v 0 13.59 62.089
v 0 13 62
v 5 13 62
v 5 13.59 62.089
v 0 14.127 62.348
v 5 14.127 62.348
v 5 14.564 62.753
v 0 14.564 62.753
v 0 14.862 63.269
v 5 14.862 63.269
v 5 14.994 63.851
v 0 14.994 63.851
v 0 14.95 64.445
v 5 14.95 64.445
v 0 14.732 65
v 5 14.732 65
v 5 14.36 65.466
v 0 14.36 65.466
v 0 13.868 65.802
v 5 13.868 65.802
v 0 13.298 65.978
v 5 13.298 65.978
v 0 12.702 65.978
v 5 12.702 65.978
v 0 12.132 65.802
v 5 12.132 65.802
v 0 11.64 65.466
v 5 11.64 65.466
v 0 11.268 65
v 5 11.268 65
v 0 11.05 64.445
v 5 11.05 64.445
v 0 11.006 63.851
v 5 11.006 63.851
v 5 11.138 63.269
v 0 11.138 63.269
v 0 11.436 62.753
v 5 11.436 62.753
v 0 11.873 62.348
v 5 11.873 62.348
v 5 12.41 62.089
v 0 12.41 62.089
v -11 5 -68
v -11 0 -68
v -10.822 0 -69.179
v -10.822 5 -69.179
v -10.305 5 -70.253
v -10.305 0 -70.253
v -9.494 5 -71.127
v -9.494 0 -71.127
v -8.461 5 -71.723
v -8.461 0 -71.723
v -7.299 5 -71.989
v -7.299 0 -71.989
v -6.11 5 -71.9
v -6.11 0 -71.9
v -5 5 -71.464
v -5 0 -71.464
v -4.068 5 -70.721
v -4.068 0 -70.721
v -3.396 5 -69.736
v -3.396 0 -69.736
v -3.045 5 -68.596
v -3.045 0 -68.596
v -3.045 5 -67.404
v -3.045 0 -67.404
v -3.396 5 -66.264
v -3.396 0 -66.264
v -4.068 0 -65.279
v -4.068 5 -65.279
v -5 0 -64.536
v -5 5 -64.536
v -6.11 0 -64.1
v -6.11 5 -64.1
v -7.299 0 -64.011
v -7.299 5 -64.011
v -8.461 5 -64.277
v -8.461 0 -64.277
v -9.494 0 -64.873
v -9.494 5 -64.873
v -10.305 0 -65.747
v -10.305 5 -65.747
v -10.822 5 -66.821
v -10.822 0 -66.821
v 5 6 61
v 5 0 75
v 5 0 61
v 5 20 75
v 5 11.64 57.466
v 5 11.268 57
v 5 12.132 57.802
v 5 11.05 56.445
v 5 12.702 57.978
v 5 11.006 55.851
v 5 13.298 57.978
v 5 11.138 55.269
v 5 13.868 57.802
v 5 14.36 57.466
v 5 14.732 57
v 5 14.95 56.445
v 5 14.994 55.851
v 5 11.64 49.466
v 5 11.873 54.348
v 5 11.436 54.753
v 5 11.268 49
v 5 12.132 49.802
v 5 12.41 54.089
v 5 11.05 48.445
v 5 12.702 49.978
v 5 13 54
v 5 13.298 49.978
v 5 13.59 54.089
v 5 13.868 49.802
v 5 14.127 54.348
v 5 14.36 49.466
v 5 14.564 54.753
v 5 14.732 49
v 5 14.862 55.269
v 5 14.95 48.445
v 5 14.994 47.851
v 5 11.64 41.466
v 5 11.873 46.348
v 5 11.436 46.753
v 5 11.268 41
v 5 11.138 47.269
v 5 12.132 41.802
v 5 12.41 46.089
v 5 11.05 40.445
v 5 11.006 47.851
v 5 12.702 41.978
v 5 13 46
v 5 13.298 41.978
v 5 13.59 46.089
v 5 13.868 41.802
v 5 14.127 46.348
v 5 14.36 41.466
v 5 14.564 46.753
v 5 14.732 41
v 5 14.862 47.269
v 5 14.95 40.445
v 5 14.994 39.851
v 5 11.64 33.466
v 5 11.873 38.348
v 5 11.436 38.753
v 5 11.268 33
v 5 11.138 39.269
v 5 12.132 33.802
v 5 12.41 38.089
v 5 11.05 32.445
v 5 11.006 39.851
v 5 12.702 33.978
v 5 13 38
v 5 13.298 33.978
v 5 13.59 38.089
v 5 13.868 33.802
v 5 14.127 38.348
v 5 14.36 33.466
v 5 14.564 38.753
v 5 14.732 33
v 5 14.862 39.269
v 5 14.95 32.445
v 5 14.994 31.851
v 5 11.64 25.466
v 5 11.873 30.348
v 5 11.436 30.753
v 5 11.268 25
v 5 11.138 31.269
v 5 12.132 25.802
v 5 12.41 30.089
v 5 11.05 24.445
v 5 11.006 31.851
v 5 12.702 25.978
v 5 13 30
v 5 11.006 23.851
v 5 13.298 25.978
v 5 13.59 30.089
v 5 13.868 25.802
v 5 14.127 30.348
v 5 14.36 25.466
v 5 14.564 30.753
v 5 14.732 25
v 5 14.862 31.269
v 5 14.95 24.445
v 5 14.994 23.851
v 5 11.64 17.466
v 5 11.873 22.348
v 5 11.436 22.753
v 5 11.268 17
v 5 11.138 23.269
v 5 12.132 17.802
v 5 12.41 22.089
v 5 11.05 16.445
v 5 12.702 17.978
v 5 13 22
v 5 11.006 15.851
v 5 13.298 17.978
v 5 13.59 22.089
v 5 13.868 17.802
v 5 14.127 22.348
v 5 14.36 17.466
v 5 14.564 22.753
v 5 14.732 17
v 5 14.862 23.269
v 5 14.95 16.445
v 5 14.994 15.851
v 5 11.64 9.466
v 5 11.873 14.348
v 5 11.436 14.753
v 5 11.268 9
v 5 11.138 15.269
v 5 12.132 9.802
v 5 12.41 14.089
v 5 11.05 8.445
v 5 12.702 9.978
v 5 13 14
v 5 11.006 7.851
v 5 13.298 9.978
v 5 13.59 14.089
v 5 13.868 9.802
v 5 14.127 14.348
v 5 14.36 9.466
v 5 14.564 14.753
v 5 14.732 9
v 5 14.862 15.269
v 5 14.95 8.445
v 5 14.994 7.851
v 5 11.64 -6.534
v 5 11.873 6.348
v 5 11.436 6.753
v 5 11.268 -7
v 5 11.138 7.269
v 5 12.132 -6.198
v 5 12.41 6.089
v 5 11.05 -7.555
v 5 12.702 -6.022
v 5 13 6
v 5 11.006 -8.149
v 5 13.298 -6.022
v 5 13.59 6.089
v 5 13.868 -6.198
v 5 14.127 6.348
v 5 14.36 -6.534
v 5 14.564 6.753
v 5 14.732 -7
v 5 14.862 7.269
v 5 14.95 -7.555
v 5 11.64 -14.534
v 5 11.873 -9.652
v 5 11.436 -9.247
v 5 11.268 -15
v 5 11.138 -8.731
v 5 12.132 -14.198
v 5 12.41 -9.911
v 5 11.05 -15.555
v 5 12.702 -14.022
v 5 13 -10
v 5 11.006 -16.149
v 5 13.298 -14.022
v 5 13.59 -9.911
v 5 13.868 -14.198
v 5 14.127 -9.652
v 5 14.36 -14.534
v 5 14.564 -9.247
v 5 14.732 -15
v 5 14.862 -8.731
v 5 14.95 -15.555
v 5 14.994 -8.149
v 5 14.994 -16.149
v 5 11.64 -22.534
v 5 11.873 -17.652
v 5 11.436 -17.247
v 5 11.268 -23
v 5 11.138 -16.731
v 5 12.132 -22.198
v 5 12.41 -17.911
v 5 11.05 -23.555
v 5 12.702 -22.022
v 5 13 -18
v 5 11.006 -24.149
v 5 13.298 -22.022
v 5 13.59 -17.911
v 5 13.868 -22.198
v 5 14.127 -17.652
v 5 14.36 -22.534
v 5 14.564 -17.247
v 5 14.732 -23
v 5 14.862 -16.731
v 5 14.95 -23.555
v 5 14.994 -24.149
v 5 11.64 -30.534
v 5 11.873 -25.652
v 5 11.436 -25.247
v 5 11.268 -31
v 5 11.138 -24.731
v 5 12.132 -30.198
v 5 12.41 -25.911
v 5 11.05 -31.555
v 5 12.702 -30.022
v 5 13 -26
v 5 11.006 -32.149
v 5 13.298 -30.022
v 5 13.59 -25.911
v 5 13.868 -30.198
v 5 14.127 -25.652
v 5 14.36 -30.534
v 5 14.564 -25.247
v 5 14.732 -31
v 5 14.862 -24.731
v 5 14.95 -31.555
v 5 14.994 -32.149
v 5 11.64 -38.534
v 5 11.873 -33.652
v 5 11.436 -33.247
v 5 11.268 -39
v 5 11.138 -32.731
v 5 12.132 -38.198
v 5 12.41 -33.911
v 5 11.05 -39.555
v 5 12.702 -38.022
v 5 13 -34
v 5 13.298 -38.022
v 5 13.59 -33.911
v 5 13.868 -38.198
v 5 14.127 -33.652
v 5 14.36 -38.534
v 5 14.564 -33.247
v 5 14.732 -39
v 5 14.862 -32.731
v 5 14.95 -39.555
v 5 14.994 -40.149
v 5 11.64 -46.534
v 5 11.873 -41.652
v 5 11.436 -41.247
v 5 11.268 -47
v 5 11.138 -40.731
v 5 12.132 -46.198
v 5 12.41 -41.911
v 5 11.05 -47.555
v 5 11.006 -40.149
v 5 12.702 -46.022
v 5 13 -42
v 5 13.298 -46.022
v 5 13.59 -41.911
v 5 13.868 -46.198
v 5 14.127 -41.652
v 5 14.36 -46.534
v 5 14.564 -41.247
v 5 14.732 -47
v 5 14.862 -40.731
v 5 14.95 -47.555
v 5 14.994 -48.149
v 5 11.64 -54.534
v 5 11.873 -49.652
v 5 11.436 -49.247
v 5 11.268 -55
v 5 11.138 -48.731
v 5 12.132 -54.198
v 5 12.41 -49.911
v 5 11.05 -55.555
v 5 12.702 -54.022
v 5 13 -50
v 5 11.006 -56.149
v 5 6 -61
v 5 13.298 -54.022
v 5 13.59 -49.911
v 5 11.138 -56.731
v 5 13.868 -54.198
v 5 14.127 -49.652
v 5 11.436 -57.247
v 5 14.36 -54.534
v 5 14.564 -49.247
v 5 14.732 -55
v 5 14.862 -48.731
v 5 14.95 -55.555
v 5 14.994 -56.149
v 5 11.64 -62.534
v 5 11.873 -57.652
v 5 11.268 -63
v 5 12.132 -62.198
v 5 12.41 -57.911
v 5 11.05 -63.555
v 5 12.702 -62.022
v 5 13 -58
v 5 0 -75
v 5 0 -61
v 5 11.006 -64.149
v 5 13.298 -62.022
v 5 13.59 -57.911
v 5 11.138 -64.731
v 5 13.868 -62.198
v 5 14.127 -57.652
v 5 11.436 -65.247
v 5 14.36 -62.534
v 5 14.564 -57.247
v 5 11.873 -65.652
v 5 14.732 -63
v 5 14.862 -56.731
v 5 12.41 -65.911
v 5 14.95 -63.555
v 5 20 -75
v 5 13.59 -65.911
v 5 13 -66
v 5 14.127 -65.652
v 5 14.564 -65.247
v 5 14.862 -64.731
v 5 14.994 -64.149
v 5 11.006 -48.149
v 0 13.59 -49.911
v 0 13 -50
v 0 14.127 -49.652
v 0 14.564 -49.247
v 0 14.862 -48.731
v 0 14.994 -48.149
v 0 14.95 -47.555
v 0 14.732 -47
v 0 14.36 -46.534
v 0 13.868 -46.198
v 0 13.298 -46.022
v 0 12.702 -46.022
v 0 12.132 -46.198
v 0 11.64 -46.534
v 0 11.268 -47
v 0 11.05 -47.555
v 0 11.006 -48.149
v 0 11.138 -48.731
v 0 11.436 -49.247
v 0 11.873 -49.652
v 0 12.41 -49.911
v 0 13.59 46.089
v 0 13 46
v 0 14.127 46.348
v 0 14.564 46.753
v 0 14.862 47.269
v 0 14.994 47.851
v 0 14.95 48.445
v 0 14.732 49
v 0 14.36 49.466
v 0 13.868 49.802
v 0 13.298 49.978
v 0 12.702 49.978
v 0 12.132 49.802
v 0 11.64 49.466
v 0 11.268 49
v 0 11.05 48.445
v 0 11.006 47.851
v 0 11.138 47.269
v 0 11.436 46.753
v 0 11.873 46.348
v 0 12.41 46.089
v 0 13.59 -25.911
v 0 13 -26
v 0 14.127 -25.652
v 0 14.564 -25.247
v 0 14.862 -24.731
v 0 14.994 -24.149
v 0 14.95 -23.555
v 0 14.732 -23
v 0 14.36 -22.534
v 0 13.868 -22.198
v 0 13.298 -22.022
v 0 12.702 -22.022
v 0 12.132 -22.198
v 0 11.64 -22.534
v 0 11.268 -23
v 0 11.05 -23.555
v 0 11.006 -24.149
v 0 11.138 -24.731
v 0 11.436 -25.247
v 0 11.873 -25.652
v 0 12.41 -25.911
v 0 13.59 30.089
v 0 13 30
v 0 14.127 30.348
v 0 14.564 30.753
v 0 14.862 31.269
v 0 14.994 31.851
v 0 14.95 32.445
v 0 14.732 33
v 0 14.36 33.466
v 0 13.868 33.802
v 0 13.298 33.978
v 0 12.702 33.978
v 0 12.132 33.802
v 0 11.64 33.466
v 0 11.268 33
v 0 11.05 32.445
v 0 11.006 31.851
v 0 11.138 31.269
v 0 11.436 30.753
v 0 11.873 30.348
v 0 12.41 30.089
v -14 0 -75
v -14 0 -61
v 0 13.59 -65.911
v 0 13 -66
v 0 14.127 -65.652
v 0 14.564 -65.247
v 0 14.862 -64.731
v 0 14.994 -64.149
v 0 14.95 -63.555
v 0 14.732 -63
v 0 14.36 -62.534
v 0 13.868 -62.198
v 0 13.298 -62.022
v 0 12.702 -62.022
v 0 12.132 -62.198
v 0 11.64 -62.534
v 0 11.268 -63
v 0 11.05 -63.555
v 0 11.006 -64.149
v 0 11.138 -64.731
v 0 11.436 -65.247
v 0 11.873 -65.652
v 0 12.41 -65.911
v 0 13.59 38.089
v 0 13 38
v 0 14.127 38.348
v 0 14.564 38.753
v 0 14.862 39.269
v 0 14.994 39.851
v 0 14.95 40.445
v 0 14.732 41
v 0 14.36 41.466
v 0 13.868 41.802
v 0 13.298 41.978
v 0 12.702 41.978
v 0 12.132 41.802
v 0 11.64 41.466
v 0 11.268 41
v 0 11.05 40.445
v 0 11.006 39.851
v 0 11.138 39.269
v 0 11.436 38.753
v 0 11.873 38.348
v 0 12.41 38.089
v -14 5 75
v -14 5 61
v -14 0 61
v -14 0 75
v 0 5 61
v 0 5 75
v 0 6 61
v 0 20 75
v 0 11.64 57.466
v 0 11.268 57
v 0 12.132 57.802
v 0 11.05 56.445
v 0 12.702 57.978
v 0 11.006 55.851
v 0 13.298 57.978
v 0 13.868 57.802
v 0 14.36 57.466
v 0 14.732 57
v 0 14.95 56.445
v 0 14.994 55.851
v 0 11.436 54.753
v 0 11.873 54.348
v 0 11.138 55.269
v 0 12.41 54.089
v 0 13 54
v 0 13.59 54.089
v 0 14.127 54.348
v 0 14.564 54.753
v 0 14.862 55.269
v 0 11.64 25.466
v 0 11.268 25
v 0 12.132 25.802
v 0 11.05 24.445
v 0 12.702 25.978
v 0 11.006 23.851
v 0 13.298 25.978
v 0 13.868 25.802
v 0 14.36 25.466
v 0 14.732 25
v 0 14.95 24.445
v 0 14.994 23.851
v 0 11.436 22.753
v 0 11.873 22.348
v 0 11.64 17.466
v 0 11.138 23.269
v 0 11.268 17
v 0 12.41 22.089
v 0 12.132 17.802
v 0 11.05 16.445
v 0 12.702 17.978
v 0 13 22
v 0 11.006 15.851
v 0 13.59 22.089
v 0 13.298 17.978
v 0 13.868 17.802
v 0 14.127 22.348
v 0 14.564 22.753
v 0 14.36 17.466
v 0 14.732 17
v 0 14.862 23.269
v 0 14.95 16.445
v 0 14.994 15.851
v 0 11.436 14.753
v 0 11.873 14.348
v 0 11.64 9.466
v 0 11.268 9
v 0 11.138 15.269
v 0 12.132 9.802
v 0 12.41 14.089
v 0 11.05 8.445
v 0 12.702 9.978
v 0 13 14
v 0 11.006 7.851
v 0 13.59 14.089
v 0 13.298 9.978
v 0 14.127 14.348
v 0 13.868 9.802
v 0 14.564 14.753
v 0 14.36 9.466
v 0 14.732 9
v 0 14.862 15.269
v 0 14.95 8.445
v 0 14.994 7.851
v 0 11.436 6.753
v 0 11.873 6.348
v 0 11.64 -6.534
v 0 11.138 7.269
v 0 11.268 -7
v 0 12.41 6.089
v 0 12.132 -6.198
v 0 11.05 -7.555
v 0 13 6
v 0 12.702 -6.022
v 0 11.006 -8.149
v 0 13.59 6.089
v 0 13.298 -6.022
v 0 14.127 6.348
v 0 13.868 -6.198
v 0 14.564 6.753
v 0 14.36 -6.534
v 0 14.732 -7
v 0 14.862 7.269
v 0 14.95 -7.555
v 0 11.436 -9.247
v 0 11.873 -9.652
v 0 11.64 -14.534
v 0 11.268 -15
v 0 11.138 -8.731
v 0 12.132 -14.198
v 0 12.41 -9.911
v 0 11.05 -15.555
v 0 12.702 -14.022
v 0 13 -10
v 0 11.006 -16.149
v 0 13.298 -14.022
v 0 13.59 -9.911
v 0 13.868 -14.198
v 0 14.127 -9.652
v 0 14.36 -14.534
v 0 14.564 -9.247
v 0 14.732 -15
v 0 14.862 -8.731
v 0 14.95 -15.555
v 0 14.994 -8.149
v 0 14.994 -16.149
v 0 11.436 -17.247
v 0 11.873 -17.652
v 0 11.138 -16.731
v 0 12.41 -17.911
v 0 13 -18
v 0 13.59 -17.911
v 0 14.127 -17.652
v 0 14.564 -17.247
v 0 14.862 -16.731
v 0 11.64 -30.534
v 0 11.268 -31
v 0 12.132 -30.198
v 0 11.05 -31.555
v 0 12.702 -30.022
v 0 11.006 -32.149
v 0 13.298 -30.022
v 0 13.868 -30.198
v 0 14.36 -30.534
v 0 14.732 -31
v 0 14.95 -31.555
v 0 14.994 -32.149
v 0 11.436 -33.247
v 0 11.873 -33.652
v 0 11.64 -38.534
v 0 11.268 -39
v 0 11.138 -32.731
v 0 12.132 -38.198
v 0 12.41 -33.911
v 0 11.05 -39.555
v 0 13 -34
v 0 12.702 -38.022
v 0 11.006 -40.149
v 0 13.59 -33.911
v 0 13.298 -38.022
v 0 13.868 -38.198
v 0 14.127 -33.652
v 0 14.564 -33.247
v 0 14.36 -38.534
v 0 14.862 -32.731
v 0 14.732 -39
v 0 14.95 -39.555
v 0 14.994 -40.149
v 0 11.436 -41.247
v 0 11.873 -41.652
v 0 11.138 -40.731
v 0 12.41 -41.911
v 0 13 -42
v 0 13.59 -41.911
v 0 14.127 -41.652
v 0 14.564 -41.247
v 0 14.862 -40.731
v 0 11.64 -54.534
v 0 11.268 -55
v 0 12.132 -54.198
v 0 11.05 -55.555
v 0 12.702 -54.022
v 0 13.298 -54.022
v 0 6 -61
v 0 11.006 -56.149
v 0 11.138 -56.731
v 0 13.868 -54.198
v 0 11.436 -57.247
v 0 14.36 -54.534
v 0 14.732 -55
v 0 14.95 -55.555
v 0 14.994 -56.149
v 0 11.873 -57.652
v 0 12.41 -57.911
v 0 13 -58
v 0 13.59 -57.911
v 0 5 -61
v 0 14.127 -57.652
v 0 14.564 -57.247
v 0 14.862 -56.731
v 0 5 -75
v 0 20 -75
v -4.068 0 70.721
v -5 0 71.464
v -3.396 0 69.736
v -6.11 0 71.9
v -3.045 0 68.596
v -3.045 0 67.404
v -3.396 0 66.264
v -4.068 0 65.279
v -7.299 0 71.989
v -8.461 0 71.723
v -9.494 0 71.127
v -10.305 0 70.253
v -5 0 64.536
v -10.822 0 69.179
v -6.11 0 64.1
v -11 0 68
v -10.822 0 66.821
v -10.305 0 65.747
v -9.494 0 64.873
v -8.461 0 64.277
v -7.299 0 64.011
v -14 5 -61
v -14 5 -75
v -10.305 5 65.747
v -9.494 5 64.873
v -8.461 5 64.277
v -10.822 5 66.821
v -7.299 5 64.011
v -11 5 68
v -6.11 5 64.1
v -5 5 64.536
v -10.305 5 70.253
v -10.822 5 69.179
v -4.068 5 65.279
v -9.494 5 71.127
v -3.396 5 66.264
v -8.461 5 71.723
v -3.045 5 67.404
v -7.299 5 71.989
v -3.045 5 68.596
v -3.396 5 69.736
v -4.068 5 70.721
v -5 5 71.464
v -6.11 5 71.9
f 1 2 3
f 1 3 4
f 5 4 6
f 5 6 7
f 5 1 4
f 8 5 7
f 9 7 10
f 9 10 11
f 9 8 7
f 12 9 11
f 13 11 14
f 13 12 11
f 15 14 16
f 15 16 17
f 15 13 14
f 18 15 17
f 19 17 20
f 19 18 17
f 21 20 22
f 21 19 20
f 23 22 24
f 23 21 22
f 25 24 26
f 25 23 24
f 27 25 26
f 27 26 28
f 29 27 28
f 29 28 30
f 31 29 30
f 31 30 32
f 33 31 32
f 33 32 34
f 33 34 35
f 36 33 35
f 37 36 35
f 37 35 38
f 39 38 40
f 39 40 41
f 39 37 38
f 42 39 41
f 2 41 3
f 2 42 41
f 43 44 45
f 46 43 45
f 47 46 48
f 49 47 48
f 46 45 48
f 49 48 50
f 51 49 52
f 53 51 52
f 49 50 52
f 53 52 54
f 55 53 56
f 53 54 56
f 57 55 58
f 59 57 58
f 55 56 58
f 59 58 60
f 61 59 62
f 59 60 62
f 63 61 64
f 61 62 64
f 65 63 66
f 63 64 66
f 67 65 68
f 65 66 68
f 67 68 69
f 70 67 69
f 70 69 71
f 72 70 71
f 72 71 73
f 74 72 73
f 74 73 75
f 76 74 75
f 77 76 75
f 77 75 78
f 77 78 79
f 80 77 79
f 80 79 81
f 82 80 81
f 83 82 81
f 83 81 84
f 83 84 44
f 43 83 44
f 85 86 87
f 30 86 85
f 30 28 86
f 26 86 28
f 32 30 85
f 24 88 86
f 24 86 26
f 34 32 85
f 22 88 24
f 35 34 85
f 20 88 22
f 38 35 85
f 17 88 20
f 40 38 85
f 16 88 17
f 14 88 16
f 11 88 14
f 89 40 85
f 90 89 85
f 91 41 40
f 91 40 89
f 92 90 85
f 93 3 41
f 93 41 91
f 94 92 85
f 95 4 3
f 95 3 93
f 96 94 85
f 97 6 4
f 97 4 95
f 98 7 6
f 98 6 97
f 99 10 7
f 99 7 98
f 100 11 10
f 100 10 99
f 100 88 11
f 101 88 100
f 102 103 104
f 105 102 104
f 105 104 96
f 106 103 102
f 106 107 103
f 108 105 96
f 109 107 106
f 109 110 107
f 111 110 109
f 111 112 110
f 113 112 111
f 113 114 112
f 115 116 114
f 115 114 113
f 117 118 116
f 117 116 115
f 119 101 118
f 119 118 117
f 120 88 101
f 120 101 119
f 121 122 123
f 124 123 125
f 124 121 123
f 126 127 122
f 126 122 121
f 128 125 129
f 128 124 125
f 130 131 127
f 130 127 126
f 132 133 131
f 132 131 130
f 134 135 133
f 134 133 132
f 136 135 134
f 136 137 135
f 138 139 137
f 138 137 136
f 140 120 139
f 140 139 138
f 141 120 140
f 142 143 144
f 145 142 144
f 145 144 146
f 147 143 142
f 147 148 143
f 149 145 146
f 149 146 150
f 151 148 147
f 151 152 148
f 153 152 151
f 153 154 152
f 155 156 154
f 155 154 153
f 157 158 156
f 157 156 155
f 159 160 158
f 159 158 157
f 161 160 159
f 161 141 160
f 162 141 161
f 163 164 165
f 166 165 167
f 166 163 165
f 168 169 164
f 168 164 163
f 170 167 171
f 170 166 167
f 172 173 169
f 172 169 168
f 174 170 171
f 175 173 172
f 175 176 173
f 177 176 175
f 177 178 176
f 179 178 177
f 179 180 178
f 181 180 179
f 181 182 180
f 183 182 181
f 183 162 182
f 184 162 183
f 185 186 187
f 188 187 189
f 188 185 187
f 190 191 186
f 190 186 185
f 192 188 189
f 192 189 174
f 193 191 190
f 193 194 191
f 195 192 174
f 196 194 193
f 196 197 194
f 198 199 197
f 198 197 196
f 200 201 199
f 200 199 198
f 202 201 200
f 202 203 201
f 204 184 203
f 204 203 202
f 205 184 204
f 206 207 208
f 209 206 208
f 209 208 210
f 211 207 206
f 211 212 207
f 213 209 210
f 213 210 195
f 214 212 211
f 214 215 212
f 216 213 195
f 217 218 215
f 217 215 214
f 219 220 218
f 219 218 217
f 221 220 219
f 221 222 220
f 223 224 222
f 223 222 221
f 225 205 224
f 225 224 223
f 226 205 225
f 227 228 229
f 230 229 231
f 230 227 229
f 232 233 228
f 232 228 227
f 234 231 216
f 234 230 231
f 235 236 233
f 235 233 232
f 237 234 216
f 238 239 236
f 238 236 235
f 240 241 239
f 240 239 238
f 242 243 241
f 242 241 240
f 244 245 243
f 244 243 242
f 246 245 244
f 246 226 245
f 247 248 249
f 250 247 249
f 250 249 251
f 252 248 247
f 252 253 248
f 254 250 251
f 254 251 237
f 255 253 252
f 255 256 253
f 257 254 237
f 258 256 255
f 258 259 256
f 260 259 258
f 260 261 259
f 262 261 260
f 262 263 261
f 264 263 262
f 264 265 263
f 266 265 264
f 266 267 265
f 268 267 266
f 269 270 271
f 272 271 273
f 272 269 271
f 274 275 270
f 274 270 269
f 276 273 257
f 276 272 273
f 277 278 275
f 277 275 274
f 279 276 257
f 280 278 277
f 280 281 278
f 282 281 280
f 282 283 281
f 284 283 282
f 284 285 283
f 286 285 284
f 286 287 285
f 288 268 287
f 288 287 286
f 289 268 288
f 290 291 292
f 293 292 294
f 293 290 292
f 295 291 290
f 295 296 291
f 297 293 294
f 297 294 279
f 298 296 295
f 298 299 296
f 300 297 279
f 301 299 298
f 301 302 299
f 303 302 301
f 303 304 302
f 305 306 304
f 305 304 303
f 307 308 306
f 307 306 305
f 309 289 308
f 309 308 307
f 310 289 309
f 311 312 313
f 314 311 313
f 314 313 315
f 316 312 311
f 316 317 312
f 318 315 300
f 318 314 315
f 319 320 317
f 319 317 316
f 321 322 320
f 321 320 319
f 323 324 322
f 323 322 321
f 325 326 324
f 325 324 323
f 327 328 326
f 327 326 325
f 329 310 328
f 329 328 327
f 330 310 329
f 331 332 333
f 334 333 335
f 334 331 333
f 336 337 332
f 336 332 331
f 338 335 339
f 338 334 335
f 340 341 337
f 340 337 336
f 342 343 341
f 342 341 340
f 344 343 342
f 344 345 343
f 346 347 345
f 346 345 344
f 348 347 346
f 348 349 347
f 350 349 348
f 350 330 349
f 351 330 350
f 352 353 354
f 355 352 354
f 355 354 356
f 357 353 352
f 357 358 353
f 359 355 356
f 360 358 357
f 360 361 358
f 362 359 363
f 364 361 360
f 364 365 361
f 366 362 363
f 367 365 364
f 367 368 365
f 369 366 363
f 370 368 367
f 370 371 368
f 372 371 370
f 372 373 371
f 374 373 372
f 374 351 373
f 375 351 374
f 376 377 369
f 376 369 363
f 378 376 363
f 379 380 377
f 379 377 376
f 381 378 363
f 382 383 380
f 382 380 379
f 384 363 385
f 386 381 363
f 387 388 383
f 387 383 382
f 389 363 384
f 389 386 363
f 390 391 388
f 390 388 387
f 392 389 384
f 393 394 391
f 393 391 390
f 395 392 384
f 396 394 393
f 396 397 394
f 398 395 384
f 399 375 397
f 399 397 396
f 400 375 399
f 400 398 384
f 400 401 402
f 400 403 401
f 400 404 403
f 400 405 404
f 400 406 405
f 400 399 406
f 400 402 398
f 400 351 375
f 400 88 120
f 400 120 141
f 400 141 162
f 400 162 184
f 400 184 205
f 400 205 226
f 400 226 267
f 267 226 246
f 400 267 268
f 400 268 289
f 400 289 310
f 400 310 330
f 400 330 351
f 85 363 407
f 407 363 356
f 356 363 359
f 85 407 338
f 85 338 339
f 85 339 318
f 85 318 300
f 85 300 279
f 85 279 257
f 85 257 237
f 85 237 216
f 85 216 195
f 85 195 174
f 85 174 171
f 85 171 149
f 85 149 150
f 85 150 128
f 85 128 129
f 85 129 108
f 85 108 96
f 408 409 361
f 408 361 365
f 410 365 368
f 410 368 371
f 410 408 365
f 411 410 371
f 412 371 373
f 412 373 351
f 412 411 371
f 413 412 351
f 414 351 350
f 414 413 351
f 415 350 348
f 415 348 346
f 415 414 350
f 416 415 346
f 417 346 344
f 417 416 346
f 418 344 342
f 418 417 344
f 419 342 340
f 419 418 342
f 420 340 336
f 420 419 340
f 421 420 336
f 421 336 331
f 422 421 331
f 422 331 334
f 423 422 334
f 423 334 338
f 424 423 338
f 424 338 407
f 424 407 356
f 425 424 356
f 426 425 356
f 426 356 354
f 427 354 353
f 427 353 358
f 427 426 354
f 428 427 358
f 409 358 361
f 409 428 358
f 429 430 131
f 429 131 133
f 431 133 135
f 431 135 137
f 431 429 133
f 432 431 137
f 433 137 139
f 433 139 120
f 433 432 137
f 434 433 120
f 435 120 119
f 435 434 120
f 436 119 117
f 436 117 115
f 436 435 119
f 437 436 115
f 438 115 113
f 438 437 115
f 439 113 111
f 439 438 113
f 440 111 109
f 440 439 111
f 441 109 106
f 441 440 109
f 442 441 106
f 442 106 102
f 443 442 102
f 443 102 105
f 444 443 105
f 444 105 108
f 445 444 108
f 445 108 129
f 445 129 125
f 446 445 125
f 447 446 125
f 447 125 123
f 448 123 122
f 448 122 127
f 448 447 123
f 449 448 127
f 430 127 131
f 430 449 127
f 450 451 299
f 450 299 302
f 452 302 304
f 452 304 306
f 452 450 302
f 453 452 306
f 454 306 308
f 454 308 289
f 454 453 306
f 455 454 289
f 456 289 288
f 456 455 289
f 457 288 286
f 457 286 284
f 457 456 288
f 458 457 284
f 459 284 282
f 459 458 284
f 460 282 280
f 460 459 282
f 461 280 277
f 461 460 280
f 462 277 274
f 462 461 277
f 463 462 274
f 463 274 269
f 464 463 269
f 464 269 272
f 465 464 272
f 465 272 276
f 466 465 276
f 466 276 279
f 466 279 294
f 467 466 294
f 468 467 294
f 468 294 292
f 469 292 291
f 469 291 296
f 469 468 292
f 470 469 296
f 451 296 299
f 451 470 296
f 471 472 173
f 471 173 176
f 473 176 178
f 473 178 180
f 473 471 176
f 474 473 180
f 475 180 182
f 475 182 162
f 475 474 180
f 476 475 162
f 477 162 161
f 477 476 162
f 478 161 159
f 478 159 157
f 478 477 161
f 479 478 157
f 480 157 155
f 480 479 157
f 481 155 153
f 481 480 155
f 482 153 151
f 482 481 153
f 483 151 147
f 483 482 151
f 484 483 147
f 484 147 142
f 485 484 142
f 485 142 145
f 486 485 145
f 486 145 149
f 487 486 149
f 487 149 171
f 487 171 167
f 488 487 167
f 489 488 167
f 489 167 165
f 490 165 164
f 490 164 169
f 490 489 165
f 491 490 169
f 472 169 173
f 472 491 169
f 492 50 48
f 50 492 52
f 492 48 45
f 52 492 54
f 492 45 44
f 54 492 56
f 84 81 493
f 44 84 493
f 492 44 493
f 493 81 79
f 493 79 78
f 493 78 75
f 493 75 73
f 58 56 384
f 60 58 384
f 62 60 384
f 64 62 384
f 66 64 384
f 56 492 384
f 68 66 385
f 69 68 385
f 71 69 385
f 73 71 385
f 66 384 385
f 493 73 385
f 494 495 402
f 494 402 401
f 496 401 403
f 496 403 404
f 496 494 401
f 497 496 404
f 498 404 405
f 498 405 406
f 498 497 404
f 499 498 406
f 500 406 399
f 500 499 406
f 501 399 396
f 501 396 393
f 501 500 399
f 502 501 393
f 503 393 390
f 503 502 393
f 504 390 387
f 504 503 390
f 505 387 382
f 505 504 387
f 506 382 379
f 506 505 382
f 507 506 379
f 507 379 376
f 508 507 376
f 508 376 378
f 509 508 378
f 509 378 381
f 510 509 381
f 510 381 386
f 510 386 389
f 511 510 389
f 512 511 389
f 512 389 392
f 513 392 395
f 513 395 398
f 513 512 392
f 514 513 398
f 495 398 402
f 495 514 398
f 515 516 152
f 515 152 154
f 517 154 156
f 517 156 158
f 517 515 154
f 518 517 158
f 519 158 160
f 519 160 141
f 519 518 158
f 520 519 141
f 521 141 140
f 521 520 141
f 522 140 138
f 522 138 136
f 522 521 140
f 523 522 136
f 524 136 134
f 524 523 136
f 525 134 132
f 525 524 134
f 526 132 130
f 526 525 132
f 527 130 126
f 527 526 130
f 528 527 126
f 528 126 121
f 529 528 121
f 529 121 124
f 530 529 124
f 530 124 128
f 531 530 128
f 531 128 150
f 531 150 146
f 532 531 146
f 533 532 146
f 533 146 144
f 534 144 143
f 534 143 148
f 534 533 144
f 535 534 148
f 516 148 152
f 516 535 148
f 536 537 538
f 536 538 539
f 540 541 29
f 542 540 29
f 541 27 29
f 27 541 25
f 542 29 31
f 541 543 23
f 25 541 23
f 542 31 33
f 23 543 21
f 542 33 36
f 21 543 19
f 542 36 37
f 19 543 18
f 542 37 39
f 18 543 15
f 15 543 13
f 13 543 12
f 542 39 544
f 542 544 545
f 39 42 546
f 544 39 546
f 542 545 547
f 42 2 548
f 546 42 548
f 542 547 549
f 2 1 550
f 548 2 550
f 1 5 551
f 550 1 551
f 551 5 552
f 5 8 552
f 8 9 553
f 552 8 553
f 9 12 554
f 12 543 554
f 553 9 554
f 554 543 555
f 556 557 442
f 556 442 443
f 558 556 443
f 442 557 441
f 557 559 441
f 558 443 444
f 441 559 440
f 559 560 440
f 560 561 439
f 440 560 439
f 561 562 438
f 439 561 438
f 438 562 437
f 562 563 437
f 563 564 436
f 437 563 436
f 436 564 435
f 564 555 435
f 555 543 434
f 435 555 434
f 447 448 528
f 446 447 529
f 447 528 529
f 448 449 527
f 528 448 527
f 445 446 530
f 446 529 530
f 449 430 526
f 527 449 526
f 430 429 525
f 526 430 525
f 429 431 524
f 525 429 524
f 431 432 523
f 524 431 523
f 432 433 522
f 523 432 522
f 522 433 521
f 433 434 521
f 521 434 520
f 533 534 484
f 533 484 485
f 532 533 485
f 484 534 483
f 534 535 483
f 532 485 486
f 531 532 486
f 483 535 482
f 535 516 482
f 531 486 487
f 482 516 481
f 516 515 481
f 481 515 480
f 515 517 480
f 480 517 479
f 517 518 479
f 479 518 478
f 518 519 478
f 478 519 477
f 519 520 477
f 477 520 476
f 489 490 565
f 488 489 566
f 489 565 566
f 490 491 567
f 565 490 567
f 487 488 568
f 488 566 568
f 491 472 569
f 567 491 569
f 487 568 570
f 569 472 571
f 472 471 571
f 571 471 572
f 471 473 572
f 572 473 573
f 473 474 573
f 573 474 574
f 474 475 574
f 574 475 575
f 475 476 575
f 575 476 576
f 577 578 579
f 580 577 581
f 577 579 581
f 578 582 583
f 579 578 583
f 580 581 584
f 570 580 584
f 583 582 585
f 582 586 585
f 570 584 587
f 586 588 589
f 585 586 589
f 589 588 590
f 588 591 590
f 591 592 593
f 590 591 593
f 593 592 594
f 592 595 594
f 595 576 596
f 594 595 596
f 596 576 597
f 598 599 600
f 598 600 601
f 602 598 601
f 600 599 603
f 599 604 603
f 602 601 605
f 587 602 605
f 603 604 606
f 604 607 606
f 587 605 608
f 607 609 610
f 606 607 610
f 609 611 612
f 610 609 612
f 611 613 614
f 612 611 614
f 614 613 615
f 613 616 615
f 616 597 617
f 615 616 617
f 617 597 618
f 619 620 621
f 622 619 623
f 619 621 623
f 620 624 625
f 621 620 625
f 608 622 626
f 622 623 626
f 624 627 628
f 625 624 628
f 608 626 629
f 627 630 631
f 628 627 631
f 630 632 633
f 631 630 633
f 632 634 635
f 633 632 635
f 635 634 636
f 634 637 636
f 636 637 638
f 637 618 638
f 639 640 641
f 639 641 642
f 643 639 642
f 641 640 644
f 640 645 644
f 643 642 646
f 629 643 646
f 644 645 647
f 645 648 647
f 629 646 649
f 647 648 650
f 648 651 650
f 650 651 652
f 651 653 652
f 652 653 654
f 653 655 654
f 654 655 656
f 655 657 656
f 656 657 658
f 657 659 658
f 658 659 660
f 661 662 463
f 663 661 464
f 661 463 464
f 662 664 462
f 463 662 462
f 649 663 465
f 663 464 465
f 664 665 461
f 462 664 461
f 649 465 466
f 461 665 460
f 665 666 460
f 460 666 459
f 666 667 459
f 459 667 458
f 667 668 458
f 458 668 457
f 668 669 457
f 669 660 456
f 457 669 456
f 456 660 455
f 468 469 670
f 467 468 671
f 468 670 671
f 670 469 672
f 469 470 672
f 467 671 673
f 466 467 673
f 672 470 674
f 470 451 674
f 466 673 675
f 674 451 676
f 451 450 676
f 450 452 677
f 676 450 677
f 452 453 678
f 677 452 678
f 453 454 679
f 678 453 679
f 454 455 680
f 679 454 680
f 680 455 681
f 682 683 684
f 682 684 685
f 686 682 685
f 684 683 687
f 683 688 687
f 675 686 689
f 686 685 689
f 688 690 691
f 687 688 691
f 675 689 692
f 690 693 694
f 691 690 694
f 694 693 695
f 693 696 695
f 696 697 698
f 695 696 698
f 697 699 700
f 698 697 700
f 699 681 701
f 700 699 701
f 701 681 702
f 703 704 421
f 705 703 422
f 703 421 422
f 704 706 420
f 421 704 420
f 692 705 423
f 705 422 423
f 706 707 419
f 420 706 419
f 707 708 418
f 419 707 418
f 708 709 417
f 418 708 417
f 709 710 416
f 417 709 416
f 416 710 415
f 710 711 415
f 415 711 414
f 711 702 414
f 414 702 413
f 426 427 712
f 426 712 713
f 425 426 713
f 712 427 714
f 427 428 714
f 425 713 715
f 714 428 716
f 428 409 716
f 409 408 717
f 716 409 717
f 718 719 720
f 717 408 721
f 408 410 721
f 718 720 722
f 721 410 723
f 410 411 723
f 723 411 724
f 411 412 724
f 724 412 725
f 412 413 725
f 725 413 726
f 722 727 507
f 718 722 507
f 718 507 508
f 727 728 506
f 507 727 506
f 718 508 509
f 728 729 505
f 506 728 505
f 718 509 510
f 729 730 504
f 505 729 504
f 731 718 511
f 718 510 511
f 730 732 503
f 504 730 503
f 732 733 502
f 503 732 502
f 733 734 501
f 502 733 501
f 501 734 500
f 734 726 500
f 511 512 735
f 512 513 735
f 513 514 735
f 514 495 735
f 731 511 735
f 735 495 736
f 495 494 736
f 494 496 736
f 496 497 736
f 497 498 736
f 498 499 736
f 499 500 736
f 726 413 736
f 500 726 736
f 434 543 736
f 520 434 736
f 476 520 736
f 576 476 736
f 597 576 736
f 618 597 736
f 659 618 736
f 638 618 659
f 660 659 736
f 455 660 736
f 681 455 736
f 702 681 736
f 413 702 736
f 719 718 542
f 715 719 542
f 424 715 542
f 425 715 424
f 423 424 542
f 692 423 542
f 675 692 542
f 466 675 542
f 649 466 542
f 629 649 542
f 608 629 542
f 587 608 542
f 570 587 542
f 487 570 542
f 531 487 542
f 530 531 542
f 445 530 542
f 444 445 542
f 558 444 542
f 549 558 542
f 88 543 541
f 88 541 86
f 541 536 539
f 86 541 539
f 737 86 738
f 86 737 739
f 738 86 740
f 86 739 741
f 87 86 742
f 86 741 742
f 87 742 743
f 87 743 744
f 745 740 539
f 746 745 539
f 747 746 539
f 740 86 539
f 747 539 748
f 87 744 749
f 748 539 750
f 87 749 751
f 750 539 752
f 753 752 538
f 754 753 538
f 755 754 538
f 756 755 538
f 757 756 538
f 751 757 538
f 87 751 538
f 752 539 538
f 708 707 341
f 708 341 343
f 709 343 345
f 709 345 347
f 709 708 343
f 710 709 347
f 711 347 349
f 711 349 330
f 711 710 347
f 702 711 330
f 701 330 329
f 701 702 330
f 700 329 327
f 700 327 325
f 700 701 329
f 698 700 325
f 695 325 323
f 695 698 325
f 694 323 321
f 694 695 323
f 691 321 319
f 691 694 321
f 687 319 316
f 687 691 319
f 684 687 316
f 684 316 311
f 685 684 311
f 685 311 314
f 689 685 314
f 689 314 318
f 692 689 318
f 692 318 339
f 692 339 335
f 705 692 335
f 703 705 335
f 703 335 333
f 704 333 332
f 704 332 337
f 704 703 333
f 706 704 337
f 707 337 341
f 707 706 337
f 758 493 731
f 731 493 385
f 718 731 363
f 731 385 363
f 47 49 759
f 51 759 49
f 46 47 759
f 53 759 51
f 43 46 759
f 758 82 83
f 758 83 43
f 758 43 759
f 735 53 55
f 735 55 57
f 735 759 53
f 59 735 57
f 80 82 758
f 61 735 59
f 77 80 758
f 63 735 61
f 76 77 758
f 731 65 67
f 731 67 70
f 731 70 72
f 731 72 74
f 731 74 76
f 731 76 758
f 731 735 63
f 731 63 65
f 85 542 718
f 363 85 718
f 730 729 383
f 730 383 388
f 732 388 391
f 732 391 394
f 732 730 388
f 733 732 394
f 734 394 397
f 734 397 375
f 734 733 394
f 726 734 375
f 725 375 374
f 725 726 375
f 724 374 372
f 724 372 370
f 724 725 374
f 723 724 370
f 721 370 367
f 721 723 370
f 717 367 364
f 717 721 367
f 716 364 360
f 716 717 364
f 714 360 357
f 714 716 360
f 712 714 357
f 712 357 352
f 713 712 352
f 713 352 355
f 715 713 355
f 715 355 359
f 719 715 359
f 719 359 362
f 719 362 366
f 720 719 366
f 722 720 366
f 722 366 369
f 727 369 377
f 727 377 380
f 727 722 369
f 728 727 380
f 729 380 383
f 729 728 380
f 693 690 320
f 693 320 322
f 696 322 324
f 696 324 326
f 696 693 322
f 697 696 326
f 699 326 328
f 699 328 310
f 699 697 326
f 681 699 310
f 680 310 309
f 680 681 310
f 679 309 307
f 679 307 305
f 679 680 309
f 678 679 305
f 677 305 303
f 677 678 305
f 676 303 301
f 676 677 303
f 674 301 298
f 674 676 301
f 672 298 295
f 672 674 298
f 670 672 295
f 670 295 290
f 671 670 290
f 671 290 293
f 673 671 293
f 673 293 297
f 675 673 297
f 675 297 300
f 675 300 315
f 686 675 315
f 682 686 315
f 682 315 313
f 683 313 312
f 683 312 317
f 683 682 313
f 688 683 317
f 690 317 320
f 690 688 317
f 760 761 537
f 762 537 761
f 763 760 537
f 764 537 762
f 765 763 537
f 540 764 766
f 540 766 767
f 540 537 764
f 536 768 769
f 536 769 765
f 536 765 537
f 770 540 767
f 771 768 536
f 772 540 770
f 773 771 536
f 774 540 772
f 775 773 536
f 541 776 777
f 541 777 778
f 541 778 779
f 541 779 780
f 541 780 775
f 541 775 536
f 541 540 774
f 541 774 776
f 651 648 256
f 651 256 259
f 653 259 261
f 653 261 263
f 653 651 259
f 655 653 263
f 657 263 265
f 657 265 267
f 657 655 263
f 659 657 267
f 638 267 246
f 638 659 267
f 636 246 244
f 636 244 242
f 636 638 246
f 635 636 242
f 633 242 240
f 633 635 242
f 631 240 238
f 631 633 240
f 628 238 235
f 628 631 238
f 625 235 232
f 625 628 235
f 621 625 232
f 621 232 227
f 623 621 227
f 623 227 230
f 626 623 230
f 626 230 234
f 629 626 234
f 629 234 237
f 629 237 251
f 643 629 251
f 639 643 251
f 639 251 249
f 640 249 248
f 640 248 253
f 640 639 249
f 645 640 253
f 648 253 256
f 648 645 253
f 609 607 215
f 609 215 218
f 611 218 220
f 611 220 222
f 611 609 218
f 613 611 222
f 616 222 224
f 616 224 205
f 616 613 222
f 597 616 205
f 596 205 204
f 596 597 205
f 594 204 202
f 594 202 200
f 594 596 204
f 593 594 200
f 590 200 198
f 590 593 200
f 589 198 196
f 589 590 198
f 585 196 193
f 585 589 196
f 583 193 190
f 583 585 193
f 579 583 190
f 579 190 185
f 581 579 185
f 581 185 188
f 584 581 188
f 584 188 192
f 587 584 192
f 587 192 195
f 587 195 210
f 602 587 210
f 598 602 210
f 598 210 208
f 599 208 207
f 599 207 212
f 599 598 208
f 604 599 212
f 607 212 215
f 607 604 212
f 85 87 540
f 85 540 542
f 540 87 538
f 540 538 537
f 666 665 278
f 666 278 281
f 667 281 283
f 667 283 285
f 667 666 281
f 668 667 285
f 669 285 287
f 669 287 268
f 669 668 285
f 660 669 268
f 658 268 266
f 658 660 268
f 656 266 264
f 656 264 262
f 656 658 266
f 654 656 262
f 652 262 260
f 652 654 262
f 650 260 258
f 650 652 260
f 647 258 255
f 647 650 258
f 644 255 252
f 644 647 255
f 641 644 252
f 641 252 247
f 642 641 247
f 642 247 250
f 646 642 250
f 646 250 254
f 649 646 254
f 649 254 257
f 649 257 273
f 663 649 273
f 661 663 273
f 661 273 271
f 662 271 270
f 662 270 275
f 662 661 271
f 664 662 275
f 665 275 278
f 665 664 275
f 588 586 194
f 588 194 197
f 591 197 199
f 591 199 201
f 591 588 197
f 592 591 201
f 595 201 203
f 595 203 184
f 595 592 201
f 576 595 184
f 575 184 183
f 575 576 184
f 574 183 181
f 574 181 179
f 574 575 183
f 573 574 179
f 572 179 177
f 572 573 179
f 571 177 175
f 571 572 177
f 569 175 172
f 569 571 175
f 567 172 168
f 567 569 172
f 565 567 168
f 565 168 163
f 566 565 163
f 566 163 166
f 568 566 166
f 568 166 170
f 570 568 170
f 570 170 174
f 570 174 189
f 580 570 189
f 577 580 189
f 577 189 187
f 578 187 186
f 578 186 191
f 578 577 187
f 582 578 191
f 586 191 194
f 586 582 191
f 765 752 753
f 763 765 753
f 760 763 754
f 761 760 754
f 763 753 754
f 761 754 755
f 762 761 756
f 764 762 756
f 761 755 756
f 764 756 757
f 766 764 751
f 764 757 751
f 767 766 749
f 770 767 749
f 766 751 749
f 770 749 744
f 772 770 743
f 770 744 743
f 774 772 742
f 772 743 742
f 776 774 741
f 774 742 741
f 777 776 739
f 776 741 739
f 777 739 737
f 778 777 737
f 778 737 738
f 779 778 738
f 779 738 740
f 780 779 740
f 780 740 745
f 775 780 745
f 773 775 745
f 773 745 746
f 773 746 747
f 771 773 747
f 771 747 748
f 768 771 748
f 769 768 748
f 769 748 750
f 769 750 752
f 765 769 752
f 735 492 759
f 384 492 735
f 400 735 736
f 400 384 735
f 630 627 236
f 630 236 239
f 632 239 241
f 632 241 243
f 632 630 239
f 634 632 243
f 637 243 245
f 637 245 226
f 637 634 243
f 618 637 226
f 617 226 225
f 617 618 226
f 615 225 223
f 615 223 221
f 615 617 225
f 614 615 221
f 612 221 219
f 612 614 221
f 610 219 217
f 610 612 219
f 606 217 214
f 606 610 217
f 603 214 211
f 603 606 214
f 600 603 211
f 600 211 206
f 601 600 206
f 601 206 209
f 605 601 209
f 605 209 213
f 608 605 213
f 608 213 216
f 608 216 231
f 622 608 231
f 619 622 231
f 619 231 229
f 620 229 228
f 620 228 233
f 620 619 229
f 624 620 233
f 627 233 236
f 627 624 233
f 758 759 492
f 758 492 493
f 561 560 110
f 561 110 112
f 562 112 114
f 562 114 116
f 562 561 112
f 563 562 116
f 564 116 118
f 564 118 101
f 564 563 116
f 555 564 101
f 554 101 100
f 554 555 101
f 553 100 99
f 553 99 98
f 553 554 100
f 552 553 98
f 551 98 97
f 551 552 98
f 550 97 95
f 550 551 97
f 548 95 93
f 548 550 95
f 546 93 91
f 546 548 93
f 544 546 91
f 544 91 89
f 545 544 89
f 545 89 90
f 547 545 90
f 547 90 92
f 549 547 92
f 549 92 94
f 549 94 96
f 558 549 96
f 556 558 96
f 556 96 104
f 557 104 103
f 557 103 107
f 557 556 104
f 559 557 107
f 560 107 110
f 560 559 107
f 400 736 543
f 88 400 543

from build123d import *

# Parameters (mm, degrees)
SKETCH1_R           = 2
BOSS_EXTRUDE1_DEPTH = 5
SKETCH2_W           = 14
SKETCH2_H           = 5
BOSS_EXTRUDE2_DEPTH = 14
SKETCH3_R           = 4
CUT_EXTRUDE1_DEPTH  = 25


with BuildPart() as part:
    # Sketch1 → Boss-Extrude1 (new body)
    with BuildSketch(Plane(origin=(0, 0, 0), x_dir=(0, 0, -1), z_dir=(1, 0, 0))):
        Polygon((61, 0), (75, 0), (75, 20), (-75, 20), (-75, 0), (-61, 0), (-61, 6), (61, 6), align=None)
        with Locations((-16, 13)):
            Circle(SKETCH1_R, mode=Mode.SUBTRACT)
        with Locations((-24, 13)):
            Circle(SKETCH1_R, mode=Mode.SUBTRACT)
        with Locations((-32, 13)):
            Circle(SKETCH1_R, mode=Mode.SUBTRACT)
        with Locations((-40, 13)):
            Circle(SKETCH1_R, mode=Mode.SUBTRACT)
        with Locations((16, 13)):
            Circle(SKETCH1_R, mode=Mode.SUBTRACT)
        with Locations((24, 13)):
            Circle(SKETCH1_R, mode=Mode.SUBTRACT)
        with Locations((32, 13)):
            Circle(SKETCH1_R, mode=Mode.SUBTRACT)
        with Locations((40, 13)):
            Circle(SKETCH1_R, mode=Mode.SUBTRACT)
        with Locations((-48, 13)):
            Circle(SKETCH1_R, mode=Mode.SUBTRACT)
        with Locations((-56, 13)):
            Circle(SKETCH1_R, mode=Mode.SUBTRACT)
        with Locations((-64, 13)):
            Circle(SKETCH1_R, mode=Mode.SUBTRACT)
        with Locations((48, 13)):
            Circle(SKETCH1_R, mode=Mode.SUBTRACT)
        with Locations((56, 13)):
            Circle(SKETCH1_R, mode=Mode.SUBTRACT)
        with Locations((64, 13)):
            Circle(SKETCH1_R, mode=Mode.SUBTRACT)
        with Locations((-8, 13)):
            Circle(SKETCH1_R, mode=Mode.SUBTRACT)
        with Locations((8, 13)):
            Circle(SKETCH1_R, mode=Mode.SUBTRACT)
    extrude(amount=BOSS_EXTRUDE1_DEPTH)

    # Sketch2 → Boss-Extrude2 (add)
    with BuildSketch(Plane.ZY):
        with Locations((-68, 2.5)):
            Rectangle(SKETCH2_W, SKETCH2_H)
        with Locations((68, 2.5)):
            Rectangle(SKETCH2_W, SKETCH2_H)
    extrude(amount=BOSS_EXTRUDE2_DEPTH)

    # Sketch3 → Cut-Extrude1 (cut)
    with BuildSketch(Plane(origin=(0, 0, 0), x_dir=(-1, 0, 0), z_dir=(0, -1, 0))):
        with Locations((7, -68)):
            Circle(SKETCH3_R)
        with Locations((7, 68)):
            Circle(SKETCH3_R)
    extrude(amount=-CUT_EXTRUDE1_DEPTH, mode=Mode.SUBTRACT)


solid = part.part
